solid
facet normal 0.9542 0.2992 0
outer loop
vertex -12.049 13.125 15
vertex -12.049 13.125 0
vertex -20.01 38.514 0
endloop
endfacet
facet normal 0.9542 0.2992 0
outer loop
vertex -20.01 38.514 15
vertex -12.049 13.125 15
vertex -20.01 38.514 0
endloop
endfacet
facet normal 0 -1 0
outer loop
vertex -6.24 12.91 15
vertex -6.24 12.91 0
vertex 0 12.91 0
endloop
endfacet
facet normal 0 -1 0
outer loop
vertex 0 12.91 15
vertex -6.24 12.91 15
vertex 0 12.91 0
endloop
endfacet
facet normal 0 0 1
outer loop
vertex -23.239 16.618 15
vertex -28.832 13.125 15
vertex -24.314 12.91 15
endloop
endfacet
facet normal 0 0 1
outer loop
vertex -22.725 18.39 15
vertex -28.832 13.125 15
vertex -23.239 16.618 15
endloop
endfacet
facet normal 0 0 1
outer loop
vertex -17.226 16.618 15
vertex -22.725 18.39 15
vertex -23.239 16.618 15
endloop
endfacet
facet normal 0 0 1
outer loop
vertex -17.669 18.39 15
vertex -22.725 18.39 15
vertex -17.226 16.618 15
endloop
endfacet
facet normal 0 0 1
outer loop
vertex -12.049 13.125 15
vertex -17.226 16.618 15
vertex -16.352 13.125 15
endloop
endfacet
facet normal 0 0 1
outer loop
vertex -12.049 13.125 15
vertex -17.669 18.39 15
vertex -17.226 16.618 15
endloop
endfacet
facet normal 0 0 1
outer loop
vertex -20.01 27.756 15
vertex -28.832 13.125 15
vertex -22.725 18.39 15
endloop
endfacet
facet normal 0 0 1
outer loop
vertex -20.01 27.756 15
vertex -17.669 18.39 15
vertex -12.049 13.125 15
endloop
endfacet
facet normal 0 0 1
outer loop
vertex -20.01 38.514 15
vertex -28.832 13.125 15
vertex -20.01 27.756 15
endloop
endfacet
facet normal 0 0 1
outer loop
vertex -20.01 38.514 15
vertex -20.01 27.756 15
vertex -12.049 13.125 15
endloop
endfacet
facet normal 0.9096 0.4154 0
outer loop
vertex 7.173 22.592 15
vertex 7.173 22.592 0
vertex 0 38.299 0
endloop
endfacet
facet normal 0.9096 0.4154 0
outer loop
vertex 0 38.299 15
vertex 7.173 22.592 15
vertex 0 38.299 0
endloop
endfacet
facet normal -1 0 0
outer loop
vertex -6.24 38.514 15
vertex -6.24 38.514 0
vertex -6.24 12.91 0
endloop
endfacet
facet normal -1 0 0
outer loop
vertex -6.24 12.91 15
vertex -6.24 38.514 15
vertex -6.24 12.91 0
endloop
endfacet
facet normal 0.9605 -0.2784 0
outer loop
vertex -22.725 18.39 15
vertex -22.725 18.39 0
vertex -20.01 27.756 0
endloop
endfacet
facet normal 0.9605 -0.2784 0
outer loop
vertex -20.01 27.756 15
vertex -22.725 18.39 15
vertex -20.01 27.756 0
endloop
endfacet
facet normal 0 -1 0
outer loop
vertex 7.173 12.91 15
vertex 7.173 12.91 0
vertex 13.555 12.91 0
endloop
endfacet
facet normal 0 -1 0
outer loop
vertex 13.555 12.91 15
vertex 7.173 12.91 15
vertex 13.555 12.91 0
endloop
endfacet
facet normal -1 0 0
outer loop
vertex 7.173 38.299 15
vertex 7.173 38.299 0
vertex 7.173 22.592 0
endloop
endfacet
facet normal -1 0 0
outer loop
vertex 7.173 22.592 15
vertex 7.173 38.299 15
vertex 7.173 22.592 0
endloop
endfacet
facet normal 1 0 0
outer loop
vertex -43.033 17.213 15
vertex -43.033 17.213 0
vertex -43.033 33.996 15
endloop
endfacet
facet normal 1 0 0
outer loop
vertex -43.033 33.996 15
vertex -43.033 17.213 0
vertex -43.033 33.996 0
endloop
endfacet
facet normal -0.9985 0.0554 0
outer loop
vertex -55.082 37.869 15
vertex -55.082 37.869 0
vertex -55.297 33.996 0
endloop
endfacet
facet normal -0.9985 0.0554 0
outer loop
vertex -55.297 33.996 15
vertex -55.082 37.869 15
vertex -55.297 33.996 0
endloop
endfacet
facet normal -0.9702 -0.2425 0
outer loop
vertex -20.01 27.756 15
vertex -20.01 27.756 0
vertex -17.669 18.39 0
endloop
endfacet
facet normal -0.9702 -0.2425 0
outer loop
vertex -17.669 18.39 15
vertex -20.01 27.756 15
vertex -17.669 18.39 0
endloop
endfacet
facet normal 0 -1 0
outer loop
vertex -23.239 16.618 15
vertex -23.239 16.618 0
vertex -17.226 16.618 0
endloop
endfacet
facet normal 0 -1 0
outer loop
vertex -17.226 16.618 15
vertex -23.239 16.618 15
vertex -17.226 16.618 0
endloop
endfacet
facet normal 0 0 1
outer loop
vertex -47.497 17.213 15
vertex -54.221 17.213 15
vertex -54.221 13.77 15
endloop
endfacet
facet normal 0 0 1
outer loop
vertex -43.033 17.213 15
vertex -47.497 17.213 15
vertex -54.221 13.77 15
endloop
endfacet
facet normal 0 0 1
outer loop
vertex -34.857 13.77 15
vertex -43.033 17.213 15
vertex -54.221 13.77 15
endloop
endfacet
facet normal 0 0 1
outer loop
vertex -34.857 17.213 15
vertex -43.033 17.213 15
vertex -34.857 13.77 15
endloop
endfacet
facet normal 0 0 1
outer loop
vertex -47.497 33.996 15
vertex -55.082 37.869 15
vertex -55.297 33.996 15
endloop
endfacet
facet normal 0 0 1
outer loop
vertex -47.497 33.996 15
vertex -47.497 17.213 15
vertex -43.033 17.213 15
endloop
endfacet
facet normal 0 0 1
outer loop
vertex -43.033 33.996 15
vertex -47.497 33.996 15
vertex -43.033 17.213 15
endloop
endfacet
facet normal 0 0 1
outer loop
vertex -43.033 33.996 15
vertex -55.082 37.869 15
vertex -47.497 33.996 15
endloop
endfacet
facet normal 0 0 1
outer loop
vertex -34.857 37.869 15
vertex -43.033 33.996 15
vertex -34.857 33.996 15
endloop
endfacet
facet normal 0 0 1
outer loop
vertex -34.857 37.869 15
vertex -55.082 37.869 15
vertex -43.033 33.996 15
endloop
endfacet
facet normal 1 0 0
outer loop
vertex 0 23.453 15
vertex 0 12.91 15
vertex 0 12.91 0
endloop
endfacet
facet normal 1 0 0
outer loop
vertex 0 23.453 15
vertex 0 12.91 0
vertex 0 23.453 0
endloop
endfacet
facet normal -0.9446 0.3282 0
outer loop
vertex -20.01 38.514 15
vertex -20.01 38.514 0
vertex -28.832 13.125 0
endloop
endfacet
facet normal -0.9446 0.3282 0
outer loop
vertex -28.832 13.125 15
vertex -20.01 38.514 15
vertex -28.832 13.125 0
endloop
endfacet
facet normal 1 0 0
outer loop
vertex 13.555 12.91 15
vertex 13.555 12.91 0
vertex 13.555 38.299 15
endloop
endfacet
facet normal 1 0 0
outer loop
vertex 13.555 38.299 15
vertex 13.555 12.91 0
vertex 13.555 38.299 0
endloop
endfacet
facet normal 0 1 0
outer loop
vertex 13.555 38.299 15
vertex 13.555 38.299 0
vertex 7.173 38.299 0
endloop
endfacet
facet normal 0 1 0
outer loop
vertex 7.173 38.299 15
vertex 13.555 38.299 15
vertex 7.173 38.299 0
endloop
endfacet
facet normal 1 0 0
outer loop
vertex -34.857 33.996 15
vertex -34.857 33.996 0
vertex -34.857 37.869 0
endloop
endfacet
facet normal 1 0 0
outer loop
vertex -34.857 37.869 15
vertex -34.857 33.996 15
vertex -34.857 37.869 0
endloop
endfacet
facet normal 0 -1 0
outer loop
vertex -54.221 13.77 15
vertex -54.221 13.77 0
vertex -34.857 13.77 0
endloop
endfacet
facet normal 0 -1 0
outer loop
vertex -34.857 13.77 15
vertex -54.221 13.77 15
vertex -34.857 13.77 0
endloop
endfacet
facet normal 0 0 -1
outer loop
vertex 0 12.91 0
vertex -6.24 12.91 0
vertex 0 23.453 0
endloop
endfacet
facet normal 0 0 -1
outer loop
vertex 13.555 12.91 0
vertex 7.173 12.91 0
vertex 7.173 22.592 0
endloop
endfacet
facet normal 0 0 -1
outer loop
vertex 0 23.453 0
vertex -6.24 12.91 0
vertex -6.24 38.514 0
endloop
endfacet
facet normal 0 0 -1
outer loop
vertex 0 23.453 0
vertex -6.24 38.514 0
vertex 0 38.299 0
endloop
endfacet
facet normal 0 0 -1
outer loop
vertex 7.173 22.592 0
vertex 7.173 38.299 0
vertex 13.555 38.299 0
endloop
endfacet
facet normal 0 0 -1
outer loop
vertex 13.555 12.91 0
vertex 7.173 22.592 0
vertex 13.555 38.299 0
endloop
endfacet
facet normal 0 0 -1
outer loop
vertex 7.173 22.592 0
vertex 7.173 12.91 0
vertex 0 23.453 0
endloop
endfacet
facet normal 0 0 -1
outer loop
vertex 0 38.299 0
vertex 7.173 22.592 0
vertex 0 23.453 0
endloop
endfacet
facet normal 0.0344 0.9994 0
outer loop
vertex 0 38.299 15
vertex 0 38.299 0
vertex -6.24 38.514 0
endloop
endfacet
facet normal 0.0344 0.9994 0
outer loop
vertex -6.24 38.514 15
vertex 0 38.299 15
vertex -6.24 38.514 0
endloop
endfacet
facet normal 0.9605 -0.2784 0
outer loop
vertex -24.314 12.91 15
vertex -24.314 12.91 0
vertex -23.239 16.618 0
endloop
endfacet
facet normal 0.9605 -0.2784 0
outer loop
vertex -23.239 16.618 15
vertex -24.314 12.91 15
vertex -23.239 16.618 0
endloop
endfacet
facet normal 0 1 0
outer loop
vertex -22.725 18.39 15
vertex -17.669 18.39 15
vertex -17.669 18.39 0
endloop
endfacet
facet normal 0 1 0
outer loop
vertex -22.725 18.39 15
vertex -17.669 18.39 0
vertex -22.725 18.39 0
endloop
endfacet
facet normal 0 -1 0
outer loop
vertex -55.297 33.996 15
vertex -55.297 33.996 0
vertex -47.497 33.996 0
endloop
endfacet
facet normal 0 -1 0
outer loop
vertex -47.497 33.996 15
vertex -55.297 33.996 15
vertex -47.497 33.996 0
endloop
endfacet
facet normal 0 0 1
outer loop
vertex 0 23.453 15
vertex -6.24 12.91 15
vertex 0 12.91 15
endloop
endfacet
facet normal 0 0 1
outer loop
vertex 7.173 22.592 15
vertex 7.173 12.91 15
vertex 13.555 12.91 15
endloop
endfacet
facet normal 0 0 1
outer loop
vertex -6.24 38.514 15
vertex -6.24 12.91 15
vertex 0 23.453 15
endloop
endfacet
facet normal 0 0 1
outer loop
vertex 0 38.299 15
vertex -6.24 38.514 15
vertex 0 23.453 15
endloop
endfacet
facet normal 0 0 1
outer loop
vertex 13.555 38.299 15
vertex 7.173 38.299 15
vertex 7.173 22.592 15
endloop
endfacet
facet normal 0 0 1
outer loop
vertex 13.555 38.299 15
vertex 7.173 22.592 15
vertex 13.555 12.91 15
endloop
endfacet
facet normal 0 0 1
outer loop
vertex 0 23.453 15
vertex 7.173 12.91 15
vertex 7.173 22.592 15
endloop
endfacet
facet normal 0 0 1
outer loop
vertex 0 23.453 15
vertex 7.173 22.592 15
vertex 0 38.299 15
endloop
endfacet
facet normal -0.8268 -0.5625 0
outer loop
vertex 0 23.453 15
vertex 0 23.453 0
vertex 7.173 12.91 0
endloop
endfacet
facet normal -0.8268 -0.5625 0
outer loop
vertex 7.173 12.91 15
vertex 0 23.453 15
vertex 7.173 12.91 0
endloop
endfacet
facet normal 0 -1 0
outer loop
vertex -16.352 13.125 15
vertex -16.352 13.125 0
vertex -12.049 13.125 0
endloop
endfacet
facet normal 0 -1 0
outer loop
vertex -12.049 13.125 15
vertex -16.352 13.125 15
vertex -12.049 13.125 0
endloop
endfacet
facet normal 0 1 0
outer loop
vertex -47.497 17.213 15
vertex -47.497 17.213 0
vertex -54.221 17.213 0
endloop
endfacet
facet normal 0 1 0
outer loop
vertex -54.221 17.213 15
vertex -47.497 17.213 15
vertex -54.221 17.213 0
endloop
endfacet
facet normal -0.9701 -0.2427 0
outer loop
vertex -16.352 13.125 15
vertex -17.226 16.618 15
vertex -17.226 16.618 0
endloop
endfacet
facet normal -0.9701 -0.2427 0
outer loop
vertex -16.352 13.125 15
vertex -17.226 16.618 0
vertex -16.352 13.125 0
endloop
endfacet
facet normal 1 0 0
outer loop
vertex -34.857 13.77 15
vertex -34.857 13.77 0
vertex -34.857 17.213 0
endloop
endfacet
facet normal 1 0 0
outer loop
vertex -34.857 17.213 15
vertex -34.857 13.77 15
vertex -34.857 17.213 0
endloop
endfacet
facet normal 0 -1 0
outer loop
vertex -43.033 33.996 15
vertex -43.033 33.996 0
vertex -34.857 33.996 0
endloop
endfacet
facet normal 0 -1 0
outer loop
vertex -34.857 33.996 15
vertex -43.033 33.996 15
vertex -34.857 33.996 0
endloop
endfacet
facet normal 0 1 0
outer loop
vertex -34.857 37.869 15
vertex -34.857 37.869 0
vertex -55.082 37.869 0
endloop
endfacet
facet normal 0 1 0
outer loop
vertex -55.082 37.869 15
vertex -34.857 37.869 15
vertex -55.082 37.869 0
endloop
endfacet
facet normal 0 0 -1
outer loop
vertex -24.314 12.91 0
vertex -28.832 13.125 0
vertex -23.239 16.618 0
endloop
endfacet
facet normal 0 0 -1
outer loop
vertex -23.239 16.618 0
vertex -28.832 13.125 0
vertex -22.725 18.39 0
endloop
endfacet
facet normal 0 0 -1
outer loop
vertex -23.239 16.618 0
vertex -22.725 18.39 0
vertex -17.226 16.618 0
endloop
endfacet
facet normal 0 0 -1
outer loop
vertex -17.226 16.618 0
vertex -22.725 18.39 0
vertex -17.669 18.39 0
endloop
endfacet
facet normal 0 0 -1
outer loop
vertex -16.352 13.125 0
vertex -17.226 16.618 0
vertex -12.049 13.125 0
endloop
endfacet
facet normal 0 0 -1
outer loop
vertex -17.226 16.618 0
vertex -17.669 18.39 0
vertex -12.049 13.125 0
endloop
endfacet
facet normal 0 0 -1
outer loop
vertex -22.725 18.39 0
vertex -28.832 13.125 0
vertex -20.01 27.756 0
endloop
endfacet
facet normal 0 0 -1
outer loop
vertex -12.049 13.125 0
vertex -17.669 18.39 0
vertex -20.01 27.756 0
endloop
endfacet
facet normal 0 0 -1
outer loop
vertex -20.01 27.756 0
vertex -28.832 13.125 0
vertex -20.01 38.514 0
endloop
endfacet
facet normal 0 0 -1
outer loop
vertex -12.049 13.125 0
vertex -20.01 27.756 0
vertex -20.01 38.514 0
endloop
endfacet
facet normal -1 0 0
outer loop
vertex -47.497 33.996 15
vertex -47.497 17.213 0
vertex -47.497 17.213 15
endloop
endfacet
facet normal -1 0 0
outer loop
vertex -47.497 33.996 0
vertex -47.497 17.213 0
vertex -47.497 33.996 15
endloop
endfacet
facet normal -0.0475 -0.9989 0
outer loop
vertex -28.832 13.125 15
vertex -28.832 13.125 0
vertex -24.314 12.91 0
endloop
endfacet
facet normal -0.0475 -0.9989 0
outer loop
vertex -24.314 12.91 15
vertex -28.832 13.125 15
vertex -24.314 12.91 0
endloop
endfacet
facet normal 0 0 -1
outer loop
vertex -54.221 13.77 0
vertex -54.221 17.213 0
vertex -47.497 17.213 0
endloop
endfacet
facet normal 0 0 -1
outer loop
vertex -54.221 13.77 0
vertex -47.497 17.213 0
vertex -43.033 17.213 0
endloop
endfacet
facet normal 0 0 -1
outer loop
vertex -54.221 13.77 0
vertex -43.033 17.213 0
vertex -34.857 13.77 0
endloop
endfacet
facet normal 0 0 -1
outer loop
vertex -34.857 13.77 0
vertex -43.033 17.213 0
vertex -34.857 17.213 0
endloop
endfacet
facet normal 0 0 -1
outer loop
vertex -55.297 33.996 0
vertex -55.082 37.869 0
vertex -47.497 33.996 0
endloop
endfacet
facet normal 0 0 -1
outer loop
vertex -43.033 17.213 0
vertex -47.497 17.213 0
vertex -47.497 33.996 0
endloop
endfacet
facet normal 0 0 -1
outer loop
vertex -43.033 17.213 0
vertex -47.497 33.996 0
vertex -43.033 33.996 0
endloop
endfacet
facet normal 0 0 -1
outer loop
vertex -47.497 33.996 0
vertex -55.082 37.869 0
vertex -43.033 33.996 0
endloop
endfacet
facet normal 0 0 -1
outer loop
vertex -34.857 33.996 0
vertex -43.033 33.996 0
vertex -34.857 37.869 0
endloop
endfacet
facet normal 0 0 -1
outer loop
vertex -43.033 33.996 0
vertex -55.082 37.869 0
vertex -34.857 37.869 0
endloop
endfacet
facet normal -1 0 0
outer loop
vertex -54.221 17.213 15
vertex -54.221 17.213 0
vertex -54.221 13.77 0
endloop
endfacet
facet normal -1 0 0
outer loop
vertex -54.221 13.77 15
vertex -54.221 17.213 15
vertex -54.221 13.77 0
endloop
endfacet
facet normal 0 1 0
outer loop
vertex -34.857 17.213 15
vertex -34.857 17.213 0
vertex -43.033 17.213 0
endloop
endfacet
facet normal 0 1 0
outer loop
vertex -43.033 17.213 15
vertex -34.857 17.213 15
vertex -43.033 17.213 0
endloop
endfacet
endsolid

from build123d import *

# Parameters (mm, degrees)
F0_W     = 1.9364729524
F0_H     = 16.7827885598
F0_W_2   = 2.528176643
F1_DEPTH = 15


with BuildPart() as f1:
    # F0 (on Top) → F1 (new body)
    with BuildSketch(Plane.XY):
        Polygon((-44.9692644179, 33.9959040284), (-44.9692644179, 37.8688536584), (-50.0256177038, 37.8688536584), (-55.0819709897, 37.8688536584), (-55.2971325815, 33.9959040284), (-47.4974410608, 33.9959040284), align=None)
        Polygon((-34.8565578461, 37.8688536584), (-44.9692644179, 37.8688536584), (-44.9692644179, 33.9959040284), (-43.0327914655, 33.9959040284), (-34.8565578461, 33.9959040284), align=None)
        Polygon((-44.9692644179, 13.7704918161), (-44.9692644179, 17.2131154686), (-47.4974410608, 17.2131154686), (-54.2213134468, 17.2131154686), (-54.2213134468, 13.7704918161), align=None)
        Polygon((-43.0327914655, 17.2131154686), (-44.9692644179, 17.2131154686), (-44.9692644179, 13.7704918161), (-34.8565578461, 13.7704918161), (-34.8565578461, 17.2131154686), align=None)
        with Locations((-44.0010279417, 25.6045097485)):
            Rectangle(F0_W, F0_H)
        with Locations((-46.2333527394, 25.6045097485)):
            Rectangle(F0_W_2, F0_H)
    extrude(amount=F1_DEPTH)


with BuildPart() as f1b:
    # F0 (on Top) → F1, piece 2 (new body)
    with BuildSketch(Plane.XY):
        Polygon((-28.831968084, 13.1250005215), (-24.3135262281, 12.9098361358), (-23.2386233684, 16.6182499781), (-22.7250179254, 18.3901882674), (-20.0102459639, 27.7561489493), (-17.6687563896, 18.3901882674), (-17.2257719301, 16.6182499781), (-16.3524597883, 13.1250005215), (-12.0491804555, 13.1250005215), (-20.0102459639, 38.5143458843), align=None)
        Polygon((-22.7250179254, 18.3901882674), (-23.2386233684, 16.6182499781), (-17.2257719301, 16.6182499781), (-17.6687563896, 18.3901882674), align=None)
    extrude(amount=F1_DEPTH)


with BuildPart() as f1c:
    # F0 (on Top) → F1, piece 3 (new body)
    with BuildSketch(Plane.XY):
        Polygon((-6.2397546135, 12.9098361358), (0, 12.9098361358), (0, 23.4528705478), (7.1727198629, 12.9098361358), (13.5553283617, 12.9098361358), (13.5553283617, 38.2991805673), (7.1727198629, 38.2991805673), (7.1727198629, 22.5922130048), (0, 38.2991805673), (-6.2397546135, 38.5143458843), align=None)
    extrude(amount=F1_DEPTH)


solid = Compound([f1.part, f1b.part, f1c.part])
